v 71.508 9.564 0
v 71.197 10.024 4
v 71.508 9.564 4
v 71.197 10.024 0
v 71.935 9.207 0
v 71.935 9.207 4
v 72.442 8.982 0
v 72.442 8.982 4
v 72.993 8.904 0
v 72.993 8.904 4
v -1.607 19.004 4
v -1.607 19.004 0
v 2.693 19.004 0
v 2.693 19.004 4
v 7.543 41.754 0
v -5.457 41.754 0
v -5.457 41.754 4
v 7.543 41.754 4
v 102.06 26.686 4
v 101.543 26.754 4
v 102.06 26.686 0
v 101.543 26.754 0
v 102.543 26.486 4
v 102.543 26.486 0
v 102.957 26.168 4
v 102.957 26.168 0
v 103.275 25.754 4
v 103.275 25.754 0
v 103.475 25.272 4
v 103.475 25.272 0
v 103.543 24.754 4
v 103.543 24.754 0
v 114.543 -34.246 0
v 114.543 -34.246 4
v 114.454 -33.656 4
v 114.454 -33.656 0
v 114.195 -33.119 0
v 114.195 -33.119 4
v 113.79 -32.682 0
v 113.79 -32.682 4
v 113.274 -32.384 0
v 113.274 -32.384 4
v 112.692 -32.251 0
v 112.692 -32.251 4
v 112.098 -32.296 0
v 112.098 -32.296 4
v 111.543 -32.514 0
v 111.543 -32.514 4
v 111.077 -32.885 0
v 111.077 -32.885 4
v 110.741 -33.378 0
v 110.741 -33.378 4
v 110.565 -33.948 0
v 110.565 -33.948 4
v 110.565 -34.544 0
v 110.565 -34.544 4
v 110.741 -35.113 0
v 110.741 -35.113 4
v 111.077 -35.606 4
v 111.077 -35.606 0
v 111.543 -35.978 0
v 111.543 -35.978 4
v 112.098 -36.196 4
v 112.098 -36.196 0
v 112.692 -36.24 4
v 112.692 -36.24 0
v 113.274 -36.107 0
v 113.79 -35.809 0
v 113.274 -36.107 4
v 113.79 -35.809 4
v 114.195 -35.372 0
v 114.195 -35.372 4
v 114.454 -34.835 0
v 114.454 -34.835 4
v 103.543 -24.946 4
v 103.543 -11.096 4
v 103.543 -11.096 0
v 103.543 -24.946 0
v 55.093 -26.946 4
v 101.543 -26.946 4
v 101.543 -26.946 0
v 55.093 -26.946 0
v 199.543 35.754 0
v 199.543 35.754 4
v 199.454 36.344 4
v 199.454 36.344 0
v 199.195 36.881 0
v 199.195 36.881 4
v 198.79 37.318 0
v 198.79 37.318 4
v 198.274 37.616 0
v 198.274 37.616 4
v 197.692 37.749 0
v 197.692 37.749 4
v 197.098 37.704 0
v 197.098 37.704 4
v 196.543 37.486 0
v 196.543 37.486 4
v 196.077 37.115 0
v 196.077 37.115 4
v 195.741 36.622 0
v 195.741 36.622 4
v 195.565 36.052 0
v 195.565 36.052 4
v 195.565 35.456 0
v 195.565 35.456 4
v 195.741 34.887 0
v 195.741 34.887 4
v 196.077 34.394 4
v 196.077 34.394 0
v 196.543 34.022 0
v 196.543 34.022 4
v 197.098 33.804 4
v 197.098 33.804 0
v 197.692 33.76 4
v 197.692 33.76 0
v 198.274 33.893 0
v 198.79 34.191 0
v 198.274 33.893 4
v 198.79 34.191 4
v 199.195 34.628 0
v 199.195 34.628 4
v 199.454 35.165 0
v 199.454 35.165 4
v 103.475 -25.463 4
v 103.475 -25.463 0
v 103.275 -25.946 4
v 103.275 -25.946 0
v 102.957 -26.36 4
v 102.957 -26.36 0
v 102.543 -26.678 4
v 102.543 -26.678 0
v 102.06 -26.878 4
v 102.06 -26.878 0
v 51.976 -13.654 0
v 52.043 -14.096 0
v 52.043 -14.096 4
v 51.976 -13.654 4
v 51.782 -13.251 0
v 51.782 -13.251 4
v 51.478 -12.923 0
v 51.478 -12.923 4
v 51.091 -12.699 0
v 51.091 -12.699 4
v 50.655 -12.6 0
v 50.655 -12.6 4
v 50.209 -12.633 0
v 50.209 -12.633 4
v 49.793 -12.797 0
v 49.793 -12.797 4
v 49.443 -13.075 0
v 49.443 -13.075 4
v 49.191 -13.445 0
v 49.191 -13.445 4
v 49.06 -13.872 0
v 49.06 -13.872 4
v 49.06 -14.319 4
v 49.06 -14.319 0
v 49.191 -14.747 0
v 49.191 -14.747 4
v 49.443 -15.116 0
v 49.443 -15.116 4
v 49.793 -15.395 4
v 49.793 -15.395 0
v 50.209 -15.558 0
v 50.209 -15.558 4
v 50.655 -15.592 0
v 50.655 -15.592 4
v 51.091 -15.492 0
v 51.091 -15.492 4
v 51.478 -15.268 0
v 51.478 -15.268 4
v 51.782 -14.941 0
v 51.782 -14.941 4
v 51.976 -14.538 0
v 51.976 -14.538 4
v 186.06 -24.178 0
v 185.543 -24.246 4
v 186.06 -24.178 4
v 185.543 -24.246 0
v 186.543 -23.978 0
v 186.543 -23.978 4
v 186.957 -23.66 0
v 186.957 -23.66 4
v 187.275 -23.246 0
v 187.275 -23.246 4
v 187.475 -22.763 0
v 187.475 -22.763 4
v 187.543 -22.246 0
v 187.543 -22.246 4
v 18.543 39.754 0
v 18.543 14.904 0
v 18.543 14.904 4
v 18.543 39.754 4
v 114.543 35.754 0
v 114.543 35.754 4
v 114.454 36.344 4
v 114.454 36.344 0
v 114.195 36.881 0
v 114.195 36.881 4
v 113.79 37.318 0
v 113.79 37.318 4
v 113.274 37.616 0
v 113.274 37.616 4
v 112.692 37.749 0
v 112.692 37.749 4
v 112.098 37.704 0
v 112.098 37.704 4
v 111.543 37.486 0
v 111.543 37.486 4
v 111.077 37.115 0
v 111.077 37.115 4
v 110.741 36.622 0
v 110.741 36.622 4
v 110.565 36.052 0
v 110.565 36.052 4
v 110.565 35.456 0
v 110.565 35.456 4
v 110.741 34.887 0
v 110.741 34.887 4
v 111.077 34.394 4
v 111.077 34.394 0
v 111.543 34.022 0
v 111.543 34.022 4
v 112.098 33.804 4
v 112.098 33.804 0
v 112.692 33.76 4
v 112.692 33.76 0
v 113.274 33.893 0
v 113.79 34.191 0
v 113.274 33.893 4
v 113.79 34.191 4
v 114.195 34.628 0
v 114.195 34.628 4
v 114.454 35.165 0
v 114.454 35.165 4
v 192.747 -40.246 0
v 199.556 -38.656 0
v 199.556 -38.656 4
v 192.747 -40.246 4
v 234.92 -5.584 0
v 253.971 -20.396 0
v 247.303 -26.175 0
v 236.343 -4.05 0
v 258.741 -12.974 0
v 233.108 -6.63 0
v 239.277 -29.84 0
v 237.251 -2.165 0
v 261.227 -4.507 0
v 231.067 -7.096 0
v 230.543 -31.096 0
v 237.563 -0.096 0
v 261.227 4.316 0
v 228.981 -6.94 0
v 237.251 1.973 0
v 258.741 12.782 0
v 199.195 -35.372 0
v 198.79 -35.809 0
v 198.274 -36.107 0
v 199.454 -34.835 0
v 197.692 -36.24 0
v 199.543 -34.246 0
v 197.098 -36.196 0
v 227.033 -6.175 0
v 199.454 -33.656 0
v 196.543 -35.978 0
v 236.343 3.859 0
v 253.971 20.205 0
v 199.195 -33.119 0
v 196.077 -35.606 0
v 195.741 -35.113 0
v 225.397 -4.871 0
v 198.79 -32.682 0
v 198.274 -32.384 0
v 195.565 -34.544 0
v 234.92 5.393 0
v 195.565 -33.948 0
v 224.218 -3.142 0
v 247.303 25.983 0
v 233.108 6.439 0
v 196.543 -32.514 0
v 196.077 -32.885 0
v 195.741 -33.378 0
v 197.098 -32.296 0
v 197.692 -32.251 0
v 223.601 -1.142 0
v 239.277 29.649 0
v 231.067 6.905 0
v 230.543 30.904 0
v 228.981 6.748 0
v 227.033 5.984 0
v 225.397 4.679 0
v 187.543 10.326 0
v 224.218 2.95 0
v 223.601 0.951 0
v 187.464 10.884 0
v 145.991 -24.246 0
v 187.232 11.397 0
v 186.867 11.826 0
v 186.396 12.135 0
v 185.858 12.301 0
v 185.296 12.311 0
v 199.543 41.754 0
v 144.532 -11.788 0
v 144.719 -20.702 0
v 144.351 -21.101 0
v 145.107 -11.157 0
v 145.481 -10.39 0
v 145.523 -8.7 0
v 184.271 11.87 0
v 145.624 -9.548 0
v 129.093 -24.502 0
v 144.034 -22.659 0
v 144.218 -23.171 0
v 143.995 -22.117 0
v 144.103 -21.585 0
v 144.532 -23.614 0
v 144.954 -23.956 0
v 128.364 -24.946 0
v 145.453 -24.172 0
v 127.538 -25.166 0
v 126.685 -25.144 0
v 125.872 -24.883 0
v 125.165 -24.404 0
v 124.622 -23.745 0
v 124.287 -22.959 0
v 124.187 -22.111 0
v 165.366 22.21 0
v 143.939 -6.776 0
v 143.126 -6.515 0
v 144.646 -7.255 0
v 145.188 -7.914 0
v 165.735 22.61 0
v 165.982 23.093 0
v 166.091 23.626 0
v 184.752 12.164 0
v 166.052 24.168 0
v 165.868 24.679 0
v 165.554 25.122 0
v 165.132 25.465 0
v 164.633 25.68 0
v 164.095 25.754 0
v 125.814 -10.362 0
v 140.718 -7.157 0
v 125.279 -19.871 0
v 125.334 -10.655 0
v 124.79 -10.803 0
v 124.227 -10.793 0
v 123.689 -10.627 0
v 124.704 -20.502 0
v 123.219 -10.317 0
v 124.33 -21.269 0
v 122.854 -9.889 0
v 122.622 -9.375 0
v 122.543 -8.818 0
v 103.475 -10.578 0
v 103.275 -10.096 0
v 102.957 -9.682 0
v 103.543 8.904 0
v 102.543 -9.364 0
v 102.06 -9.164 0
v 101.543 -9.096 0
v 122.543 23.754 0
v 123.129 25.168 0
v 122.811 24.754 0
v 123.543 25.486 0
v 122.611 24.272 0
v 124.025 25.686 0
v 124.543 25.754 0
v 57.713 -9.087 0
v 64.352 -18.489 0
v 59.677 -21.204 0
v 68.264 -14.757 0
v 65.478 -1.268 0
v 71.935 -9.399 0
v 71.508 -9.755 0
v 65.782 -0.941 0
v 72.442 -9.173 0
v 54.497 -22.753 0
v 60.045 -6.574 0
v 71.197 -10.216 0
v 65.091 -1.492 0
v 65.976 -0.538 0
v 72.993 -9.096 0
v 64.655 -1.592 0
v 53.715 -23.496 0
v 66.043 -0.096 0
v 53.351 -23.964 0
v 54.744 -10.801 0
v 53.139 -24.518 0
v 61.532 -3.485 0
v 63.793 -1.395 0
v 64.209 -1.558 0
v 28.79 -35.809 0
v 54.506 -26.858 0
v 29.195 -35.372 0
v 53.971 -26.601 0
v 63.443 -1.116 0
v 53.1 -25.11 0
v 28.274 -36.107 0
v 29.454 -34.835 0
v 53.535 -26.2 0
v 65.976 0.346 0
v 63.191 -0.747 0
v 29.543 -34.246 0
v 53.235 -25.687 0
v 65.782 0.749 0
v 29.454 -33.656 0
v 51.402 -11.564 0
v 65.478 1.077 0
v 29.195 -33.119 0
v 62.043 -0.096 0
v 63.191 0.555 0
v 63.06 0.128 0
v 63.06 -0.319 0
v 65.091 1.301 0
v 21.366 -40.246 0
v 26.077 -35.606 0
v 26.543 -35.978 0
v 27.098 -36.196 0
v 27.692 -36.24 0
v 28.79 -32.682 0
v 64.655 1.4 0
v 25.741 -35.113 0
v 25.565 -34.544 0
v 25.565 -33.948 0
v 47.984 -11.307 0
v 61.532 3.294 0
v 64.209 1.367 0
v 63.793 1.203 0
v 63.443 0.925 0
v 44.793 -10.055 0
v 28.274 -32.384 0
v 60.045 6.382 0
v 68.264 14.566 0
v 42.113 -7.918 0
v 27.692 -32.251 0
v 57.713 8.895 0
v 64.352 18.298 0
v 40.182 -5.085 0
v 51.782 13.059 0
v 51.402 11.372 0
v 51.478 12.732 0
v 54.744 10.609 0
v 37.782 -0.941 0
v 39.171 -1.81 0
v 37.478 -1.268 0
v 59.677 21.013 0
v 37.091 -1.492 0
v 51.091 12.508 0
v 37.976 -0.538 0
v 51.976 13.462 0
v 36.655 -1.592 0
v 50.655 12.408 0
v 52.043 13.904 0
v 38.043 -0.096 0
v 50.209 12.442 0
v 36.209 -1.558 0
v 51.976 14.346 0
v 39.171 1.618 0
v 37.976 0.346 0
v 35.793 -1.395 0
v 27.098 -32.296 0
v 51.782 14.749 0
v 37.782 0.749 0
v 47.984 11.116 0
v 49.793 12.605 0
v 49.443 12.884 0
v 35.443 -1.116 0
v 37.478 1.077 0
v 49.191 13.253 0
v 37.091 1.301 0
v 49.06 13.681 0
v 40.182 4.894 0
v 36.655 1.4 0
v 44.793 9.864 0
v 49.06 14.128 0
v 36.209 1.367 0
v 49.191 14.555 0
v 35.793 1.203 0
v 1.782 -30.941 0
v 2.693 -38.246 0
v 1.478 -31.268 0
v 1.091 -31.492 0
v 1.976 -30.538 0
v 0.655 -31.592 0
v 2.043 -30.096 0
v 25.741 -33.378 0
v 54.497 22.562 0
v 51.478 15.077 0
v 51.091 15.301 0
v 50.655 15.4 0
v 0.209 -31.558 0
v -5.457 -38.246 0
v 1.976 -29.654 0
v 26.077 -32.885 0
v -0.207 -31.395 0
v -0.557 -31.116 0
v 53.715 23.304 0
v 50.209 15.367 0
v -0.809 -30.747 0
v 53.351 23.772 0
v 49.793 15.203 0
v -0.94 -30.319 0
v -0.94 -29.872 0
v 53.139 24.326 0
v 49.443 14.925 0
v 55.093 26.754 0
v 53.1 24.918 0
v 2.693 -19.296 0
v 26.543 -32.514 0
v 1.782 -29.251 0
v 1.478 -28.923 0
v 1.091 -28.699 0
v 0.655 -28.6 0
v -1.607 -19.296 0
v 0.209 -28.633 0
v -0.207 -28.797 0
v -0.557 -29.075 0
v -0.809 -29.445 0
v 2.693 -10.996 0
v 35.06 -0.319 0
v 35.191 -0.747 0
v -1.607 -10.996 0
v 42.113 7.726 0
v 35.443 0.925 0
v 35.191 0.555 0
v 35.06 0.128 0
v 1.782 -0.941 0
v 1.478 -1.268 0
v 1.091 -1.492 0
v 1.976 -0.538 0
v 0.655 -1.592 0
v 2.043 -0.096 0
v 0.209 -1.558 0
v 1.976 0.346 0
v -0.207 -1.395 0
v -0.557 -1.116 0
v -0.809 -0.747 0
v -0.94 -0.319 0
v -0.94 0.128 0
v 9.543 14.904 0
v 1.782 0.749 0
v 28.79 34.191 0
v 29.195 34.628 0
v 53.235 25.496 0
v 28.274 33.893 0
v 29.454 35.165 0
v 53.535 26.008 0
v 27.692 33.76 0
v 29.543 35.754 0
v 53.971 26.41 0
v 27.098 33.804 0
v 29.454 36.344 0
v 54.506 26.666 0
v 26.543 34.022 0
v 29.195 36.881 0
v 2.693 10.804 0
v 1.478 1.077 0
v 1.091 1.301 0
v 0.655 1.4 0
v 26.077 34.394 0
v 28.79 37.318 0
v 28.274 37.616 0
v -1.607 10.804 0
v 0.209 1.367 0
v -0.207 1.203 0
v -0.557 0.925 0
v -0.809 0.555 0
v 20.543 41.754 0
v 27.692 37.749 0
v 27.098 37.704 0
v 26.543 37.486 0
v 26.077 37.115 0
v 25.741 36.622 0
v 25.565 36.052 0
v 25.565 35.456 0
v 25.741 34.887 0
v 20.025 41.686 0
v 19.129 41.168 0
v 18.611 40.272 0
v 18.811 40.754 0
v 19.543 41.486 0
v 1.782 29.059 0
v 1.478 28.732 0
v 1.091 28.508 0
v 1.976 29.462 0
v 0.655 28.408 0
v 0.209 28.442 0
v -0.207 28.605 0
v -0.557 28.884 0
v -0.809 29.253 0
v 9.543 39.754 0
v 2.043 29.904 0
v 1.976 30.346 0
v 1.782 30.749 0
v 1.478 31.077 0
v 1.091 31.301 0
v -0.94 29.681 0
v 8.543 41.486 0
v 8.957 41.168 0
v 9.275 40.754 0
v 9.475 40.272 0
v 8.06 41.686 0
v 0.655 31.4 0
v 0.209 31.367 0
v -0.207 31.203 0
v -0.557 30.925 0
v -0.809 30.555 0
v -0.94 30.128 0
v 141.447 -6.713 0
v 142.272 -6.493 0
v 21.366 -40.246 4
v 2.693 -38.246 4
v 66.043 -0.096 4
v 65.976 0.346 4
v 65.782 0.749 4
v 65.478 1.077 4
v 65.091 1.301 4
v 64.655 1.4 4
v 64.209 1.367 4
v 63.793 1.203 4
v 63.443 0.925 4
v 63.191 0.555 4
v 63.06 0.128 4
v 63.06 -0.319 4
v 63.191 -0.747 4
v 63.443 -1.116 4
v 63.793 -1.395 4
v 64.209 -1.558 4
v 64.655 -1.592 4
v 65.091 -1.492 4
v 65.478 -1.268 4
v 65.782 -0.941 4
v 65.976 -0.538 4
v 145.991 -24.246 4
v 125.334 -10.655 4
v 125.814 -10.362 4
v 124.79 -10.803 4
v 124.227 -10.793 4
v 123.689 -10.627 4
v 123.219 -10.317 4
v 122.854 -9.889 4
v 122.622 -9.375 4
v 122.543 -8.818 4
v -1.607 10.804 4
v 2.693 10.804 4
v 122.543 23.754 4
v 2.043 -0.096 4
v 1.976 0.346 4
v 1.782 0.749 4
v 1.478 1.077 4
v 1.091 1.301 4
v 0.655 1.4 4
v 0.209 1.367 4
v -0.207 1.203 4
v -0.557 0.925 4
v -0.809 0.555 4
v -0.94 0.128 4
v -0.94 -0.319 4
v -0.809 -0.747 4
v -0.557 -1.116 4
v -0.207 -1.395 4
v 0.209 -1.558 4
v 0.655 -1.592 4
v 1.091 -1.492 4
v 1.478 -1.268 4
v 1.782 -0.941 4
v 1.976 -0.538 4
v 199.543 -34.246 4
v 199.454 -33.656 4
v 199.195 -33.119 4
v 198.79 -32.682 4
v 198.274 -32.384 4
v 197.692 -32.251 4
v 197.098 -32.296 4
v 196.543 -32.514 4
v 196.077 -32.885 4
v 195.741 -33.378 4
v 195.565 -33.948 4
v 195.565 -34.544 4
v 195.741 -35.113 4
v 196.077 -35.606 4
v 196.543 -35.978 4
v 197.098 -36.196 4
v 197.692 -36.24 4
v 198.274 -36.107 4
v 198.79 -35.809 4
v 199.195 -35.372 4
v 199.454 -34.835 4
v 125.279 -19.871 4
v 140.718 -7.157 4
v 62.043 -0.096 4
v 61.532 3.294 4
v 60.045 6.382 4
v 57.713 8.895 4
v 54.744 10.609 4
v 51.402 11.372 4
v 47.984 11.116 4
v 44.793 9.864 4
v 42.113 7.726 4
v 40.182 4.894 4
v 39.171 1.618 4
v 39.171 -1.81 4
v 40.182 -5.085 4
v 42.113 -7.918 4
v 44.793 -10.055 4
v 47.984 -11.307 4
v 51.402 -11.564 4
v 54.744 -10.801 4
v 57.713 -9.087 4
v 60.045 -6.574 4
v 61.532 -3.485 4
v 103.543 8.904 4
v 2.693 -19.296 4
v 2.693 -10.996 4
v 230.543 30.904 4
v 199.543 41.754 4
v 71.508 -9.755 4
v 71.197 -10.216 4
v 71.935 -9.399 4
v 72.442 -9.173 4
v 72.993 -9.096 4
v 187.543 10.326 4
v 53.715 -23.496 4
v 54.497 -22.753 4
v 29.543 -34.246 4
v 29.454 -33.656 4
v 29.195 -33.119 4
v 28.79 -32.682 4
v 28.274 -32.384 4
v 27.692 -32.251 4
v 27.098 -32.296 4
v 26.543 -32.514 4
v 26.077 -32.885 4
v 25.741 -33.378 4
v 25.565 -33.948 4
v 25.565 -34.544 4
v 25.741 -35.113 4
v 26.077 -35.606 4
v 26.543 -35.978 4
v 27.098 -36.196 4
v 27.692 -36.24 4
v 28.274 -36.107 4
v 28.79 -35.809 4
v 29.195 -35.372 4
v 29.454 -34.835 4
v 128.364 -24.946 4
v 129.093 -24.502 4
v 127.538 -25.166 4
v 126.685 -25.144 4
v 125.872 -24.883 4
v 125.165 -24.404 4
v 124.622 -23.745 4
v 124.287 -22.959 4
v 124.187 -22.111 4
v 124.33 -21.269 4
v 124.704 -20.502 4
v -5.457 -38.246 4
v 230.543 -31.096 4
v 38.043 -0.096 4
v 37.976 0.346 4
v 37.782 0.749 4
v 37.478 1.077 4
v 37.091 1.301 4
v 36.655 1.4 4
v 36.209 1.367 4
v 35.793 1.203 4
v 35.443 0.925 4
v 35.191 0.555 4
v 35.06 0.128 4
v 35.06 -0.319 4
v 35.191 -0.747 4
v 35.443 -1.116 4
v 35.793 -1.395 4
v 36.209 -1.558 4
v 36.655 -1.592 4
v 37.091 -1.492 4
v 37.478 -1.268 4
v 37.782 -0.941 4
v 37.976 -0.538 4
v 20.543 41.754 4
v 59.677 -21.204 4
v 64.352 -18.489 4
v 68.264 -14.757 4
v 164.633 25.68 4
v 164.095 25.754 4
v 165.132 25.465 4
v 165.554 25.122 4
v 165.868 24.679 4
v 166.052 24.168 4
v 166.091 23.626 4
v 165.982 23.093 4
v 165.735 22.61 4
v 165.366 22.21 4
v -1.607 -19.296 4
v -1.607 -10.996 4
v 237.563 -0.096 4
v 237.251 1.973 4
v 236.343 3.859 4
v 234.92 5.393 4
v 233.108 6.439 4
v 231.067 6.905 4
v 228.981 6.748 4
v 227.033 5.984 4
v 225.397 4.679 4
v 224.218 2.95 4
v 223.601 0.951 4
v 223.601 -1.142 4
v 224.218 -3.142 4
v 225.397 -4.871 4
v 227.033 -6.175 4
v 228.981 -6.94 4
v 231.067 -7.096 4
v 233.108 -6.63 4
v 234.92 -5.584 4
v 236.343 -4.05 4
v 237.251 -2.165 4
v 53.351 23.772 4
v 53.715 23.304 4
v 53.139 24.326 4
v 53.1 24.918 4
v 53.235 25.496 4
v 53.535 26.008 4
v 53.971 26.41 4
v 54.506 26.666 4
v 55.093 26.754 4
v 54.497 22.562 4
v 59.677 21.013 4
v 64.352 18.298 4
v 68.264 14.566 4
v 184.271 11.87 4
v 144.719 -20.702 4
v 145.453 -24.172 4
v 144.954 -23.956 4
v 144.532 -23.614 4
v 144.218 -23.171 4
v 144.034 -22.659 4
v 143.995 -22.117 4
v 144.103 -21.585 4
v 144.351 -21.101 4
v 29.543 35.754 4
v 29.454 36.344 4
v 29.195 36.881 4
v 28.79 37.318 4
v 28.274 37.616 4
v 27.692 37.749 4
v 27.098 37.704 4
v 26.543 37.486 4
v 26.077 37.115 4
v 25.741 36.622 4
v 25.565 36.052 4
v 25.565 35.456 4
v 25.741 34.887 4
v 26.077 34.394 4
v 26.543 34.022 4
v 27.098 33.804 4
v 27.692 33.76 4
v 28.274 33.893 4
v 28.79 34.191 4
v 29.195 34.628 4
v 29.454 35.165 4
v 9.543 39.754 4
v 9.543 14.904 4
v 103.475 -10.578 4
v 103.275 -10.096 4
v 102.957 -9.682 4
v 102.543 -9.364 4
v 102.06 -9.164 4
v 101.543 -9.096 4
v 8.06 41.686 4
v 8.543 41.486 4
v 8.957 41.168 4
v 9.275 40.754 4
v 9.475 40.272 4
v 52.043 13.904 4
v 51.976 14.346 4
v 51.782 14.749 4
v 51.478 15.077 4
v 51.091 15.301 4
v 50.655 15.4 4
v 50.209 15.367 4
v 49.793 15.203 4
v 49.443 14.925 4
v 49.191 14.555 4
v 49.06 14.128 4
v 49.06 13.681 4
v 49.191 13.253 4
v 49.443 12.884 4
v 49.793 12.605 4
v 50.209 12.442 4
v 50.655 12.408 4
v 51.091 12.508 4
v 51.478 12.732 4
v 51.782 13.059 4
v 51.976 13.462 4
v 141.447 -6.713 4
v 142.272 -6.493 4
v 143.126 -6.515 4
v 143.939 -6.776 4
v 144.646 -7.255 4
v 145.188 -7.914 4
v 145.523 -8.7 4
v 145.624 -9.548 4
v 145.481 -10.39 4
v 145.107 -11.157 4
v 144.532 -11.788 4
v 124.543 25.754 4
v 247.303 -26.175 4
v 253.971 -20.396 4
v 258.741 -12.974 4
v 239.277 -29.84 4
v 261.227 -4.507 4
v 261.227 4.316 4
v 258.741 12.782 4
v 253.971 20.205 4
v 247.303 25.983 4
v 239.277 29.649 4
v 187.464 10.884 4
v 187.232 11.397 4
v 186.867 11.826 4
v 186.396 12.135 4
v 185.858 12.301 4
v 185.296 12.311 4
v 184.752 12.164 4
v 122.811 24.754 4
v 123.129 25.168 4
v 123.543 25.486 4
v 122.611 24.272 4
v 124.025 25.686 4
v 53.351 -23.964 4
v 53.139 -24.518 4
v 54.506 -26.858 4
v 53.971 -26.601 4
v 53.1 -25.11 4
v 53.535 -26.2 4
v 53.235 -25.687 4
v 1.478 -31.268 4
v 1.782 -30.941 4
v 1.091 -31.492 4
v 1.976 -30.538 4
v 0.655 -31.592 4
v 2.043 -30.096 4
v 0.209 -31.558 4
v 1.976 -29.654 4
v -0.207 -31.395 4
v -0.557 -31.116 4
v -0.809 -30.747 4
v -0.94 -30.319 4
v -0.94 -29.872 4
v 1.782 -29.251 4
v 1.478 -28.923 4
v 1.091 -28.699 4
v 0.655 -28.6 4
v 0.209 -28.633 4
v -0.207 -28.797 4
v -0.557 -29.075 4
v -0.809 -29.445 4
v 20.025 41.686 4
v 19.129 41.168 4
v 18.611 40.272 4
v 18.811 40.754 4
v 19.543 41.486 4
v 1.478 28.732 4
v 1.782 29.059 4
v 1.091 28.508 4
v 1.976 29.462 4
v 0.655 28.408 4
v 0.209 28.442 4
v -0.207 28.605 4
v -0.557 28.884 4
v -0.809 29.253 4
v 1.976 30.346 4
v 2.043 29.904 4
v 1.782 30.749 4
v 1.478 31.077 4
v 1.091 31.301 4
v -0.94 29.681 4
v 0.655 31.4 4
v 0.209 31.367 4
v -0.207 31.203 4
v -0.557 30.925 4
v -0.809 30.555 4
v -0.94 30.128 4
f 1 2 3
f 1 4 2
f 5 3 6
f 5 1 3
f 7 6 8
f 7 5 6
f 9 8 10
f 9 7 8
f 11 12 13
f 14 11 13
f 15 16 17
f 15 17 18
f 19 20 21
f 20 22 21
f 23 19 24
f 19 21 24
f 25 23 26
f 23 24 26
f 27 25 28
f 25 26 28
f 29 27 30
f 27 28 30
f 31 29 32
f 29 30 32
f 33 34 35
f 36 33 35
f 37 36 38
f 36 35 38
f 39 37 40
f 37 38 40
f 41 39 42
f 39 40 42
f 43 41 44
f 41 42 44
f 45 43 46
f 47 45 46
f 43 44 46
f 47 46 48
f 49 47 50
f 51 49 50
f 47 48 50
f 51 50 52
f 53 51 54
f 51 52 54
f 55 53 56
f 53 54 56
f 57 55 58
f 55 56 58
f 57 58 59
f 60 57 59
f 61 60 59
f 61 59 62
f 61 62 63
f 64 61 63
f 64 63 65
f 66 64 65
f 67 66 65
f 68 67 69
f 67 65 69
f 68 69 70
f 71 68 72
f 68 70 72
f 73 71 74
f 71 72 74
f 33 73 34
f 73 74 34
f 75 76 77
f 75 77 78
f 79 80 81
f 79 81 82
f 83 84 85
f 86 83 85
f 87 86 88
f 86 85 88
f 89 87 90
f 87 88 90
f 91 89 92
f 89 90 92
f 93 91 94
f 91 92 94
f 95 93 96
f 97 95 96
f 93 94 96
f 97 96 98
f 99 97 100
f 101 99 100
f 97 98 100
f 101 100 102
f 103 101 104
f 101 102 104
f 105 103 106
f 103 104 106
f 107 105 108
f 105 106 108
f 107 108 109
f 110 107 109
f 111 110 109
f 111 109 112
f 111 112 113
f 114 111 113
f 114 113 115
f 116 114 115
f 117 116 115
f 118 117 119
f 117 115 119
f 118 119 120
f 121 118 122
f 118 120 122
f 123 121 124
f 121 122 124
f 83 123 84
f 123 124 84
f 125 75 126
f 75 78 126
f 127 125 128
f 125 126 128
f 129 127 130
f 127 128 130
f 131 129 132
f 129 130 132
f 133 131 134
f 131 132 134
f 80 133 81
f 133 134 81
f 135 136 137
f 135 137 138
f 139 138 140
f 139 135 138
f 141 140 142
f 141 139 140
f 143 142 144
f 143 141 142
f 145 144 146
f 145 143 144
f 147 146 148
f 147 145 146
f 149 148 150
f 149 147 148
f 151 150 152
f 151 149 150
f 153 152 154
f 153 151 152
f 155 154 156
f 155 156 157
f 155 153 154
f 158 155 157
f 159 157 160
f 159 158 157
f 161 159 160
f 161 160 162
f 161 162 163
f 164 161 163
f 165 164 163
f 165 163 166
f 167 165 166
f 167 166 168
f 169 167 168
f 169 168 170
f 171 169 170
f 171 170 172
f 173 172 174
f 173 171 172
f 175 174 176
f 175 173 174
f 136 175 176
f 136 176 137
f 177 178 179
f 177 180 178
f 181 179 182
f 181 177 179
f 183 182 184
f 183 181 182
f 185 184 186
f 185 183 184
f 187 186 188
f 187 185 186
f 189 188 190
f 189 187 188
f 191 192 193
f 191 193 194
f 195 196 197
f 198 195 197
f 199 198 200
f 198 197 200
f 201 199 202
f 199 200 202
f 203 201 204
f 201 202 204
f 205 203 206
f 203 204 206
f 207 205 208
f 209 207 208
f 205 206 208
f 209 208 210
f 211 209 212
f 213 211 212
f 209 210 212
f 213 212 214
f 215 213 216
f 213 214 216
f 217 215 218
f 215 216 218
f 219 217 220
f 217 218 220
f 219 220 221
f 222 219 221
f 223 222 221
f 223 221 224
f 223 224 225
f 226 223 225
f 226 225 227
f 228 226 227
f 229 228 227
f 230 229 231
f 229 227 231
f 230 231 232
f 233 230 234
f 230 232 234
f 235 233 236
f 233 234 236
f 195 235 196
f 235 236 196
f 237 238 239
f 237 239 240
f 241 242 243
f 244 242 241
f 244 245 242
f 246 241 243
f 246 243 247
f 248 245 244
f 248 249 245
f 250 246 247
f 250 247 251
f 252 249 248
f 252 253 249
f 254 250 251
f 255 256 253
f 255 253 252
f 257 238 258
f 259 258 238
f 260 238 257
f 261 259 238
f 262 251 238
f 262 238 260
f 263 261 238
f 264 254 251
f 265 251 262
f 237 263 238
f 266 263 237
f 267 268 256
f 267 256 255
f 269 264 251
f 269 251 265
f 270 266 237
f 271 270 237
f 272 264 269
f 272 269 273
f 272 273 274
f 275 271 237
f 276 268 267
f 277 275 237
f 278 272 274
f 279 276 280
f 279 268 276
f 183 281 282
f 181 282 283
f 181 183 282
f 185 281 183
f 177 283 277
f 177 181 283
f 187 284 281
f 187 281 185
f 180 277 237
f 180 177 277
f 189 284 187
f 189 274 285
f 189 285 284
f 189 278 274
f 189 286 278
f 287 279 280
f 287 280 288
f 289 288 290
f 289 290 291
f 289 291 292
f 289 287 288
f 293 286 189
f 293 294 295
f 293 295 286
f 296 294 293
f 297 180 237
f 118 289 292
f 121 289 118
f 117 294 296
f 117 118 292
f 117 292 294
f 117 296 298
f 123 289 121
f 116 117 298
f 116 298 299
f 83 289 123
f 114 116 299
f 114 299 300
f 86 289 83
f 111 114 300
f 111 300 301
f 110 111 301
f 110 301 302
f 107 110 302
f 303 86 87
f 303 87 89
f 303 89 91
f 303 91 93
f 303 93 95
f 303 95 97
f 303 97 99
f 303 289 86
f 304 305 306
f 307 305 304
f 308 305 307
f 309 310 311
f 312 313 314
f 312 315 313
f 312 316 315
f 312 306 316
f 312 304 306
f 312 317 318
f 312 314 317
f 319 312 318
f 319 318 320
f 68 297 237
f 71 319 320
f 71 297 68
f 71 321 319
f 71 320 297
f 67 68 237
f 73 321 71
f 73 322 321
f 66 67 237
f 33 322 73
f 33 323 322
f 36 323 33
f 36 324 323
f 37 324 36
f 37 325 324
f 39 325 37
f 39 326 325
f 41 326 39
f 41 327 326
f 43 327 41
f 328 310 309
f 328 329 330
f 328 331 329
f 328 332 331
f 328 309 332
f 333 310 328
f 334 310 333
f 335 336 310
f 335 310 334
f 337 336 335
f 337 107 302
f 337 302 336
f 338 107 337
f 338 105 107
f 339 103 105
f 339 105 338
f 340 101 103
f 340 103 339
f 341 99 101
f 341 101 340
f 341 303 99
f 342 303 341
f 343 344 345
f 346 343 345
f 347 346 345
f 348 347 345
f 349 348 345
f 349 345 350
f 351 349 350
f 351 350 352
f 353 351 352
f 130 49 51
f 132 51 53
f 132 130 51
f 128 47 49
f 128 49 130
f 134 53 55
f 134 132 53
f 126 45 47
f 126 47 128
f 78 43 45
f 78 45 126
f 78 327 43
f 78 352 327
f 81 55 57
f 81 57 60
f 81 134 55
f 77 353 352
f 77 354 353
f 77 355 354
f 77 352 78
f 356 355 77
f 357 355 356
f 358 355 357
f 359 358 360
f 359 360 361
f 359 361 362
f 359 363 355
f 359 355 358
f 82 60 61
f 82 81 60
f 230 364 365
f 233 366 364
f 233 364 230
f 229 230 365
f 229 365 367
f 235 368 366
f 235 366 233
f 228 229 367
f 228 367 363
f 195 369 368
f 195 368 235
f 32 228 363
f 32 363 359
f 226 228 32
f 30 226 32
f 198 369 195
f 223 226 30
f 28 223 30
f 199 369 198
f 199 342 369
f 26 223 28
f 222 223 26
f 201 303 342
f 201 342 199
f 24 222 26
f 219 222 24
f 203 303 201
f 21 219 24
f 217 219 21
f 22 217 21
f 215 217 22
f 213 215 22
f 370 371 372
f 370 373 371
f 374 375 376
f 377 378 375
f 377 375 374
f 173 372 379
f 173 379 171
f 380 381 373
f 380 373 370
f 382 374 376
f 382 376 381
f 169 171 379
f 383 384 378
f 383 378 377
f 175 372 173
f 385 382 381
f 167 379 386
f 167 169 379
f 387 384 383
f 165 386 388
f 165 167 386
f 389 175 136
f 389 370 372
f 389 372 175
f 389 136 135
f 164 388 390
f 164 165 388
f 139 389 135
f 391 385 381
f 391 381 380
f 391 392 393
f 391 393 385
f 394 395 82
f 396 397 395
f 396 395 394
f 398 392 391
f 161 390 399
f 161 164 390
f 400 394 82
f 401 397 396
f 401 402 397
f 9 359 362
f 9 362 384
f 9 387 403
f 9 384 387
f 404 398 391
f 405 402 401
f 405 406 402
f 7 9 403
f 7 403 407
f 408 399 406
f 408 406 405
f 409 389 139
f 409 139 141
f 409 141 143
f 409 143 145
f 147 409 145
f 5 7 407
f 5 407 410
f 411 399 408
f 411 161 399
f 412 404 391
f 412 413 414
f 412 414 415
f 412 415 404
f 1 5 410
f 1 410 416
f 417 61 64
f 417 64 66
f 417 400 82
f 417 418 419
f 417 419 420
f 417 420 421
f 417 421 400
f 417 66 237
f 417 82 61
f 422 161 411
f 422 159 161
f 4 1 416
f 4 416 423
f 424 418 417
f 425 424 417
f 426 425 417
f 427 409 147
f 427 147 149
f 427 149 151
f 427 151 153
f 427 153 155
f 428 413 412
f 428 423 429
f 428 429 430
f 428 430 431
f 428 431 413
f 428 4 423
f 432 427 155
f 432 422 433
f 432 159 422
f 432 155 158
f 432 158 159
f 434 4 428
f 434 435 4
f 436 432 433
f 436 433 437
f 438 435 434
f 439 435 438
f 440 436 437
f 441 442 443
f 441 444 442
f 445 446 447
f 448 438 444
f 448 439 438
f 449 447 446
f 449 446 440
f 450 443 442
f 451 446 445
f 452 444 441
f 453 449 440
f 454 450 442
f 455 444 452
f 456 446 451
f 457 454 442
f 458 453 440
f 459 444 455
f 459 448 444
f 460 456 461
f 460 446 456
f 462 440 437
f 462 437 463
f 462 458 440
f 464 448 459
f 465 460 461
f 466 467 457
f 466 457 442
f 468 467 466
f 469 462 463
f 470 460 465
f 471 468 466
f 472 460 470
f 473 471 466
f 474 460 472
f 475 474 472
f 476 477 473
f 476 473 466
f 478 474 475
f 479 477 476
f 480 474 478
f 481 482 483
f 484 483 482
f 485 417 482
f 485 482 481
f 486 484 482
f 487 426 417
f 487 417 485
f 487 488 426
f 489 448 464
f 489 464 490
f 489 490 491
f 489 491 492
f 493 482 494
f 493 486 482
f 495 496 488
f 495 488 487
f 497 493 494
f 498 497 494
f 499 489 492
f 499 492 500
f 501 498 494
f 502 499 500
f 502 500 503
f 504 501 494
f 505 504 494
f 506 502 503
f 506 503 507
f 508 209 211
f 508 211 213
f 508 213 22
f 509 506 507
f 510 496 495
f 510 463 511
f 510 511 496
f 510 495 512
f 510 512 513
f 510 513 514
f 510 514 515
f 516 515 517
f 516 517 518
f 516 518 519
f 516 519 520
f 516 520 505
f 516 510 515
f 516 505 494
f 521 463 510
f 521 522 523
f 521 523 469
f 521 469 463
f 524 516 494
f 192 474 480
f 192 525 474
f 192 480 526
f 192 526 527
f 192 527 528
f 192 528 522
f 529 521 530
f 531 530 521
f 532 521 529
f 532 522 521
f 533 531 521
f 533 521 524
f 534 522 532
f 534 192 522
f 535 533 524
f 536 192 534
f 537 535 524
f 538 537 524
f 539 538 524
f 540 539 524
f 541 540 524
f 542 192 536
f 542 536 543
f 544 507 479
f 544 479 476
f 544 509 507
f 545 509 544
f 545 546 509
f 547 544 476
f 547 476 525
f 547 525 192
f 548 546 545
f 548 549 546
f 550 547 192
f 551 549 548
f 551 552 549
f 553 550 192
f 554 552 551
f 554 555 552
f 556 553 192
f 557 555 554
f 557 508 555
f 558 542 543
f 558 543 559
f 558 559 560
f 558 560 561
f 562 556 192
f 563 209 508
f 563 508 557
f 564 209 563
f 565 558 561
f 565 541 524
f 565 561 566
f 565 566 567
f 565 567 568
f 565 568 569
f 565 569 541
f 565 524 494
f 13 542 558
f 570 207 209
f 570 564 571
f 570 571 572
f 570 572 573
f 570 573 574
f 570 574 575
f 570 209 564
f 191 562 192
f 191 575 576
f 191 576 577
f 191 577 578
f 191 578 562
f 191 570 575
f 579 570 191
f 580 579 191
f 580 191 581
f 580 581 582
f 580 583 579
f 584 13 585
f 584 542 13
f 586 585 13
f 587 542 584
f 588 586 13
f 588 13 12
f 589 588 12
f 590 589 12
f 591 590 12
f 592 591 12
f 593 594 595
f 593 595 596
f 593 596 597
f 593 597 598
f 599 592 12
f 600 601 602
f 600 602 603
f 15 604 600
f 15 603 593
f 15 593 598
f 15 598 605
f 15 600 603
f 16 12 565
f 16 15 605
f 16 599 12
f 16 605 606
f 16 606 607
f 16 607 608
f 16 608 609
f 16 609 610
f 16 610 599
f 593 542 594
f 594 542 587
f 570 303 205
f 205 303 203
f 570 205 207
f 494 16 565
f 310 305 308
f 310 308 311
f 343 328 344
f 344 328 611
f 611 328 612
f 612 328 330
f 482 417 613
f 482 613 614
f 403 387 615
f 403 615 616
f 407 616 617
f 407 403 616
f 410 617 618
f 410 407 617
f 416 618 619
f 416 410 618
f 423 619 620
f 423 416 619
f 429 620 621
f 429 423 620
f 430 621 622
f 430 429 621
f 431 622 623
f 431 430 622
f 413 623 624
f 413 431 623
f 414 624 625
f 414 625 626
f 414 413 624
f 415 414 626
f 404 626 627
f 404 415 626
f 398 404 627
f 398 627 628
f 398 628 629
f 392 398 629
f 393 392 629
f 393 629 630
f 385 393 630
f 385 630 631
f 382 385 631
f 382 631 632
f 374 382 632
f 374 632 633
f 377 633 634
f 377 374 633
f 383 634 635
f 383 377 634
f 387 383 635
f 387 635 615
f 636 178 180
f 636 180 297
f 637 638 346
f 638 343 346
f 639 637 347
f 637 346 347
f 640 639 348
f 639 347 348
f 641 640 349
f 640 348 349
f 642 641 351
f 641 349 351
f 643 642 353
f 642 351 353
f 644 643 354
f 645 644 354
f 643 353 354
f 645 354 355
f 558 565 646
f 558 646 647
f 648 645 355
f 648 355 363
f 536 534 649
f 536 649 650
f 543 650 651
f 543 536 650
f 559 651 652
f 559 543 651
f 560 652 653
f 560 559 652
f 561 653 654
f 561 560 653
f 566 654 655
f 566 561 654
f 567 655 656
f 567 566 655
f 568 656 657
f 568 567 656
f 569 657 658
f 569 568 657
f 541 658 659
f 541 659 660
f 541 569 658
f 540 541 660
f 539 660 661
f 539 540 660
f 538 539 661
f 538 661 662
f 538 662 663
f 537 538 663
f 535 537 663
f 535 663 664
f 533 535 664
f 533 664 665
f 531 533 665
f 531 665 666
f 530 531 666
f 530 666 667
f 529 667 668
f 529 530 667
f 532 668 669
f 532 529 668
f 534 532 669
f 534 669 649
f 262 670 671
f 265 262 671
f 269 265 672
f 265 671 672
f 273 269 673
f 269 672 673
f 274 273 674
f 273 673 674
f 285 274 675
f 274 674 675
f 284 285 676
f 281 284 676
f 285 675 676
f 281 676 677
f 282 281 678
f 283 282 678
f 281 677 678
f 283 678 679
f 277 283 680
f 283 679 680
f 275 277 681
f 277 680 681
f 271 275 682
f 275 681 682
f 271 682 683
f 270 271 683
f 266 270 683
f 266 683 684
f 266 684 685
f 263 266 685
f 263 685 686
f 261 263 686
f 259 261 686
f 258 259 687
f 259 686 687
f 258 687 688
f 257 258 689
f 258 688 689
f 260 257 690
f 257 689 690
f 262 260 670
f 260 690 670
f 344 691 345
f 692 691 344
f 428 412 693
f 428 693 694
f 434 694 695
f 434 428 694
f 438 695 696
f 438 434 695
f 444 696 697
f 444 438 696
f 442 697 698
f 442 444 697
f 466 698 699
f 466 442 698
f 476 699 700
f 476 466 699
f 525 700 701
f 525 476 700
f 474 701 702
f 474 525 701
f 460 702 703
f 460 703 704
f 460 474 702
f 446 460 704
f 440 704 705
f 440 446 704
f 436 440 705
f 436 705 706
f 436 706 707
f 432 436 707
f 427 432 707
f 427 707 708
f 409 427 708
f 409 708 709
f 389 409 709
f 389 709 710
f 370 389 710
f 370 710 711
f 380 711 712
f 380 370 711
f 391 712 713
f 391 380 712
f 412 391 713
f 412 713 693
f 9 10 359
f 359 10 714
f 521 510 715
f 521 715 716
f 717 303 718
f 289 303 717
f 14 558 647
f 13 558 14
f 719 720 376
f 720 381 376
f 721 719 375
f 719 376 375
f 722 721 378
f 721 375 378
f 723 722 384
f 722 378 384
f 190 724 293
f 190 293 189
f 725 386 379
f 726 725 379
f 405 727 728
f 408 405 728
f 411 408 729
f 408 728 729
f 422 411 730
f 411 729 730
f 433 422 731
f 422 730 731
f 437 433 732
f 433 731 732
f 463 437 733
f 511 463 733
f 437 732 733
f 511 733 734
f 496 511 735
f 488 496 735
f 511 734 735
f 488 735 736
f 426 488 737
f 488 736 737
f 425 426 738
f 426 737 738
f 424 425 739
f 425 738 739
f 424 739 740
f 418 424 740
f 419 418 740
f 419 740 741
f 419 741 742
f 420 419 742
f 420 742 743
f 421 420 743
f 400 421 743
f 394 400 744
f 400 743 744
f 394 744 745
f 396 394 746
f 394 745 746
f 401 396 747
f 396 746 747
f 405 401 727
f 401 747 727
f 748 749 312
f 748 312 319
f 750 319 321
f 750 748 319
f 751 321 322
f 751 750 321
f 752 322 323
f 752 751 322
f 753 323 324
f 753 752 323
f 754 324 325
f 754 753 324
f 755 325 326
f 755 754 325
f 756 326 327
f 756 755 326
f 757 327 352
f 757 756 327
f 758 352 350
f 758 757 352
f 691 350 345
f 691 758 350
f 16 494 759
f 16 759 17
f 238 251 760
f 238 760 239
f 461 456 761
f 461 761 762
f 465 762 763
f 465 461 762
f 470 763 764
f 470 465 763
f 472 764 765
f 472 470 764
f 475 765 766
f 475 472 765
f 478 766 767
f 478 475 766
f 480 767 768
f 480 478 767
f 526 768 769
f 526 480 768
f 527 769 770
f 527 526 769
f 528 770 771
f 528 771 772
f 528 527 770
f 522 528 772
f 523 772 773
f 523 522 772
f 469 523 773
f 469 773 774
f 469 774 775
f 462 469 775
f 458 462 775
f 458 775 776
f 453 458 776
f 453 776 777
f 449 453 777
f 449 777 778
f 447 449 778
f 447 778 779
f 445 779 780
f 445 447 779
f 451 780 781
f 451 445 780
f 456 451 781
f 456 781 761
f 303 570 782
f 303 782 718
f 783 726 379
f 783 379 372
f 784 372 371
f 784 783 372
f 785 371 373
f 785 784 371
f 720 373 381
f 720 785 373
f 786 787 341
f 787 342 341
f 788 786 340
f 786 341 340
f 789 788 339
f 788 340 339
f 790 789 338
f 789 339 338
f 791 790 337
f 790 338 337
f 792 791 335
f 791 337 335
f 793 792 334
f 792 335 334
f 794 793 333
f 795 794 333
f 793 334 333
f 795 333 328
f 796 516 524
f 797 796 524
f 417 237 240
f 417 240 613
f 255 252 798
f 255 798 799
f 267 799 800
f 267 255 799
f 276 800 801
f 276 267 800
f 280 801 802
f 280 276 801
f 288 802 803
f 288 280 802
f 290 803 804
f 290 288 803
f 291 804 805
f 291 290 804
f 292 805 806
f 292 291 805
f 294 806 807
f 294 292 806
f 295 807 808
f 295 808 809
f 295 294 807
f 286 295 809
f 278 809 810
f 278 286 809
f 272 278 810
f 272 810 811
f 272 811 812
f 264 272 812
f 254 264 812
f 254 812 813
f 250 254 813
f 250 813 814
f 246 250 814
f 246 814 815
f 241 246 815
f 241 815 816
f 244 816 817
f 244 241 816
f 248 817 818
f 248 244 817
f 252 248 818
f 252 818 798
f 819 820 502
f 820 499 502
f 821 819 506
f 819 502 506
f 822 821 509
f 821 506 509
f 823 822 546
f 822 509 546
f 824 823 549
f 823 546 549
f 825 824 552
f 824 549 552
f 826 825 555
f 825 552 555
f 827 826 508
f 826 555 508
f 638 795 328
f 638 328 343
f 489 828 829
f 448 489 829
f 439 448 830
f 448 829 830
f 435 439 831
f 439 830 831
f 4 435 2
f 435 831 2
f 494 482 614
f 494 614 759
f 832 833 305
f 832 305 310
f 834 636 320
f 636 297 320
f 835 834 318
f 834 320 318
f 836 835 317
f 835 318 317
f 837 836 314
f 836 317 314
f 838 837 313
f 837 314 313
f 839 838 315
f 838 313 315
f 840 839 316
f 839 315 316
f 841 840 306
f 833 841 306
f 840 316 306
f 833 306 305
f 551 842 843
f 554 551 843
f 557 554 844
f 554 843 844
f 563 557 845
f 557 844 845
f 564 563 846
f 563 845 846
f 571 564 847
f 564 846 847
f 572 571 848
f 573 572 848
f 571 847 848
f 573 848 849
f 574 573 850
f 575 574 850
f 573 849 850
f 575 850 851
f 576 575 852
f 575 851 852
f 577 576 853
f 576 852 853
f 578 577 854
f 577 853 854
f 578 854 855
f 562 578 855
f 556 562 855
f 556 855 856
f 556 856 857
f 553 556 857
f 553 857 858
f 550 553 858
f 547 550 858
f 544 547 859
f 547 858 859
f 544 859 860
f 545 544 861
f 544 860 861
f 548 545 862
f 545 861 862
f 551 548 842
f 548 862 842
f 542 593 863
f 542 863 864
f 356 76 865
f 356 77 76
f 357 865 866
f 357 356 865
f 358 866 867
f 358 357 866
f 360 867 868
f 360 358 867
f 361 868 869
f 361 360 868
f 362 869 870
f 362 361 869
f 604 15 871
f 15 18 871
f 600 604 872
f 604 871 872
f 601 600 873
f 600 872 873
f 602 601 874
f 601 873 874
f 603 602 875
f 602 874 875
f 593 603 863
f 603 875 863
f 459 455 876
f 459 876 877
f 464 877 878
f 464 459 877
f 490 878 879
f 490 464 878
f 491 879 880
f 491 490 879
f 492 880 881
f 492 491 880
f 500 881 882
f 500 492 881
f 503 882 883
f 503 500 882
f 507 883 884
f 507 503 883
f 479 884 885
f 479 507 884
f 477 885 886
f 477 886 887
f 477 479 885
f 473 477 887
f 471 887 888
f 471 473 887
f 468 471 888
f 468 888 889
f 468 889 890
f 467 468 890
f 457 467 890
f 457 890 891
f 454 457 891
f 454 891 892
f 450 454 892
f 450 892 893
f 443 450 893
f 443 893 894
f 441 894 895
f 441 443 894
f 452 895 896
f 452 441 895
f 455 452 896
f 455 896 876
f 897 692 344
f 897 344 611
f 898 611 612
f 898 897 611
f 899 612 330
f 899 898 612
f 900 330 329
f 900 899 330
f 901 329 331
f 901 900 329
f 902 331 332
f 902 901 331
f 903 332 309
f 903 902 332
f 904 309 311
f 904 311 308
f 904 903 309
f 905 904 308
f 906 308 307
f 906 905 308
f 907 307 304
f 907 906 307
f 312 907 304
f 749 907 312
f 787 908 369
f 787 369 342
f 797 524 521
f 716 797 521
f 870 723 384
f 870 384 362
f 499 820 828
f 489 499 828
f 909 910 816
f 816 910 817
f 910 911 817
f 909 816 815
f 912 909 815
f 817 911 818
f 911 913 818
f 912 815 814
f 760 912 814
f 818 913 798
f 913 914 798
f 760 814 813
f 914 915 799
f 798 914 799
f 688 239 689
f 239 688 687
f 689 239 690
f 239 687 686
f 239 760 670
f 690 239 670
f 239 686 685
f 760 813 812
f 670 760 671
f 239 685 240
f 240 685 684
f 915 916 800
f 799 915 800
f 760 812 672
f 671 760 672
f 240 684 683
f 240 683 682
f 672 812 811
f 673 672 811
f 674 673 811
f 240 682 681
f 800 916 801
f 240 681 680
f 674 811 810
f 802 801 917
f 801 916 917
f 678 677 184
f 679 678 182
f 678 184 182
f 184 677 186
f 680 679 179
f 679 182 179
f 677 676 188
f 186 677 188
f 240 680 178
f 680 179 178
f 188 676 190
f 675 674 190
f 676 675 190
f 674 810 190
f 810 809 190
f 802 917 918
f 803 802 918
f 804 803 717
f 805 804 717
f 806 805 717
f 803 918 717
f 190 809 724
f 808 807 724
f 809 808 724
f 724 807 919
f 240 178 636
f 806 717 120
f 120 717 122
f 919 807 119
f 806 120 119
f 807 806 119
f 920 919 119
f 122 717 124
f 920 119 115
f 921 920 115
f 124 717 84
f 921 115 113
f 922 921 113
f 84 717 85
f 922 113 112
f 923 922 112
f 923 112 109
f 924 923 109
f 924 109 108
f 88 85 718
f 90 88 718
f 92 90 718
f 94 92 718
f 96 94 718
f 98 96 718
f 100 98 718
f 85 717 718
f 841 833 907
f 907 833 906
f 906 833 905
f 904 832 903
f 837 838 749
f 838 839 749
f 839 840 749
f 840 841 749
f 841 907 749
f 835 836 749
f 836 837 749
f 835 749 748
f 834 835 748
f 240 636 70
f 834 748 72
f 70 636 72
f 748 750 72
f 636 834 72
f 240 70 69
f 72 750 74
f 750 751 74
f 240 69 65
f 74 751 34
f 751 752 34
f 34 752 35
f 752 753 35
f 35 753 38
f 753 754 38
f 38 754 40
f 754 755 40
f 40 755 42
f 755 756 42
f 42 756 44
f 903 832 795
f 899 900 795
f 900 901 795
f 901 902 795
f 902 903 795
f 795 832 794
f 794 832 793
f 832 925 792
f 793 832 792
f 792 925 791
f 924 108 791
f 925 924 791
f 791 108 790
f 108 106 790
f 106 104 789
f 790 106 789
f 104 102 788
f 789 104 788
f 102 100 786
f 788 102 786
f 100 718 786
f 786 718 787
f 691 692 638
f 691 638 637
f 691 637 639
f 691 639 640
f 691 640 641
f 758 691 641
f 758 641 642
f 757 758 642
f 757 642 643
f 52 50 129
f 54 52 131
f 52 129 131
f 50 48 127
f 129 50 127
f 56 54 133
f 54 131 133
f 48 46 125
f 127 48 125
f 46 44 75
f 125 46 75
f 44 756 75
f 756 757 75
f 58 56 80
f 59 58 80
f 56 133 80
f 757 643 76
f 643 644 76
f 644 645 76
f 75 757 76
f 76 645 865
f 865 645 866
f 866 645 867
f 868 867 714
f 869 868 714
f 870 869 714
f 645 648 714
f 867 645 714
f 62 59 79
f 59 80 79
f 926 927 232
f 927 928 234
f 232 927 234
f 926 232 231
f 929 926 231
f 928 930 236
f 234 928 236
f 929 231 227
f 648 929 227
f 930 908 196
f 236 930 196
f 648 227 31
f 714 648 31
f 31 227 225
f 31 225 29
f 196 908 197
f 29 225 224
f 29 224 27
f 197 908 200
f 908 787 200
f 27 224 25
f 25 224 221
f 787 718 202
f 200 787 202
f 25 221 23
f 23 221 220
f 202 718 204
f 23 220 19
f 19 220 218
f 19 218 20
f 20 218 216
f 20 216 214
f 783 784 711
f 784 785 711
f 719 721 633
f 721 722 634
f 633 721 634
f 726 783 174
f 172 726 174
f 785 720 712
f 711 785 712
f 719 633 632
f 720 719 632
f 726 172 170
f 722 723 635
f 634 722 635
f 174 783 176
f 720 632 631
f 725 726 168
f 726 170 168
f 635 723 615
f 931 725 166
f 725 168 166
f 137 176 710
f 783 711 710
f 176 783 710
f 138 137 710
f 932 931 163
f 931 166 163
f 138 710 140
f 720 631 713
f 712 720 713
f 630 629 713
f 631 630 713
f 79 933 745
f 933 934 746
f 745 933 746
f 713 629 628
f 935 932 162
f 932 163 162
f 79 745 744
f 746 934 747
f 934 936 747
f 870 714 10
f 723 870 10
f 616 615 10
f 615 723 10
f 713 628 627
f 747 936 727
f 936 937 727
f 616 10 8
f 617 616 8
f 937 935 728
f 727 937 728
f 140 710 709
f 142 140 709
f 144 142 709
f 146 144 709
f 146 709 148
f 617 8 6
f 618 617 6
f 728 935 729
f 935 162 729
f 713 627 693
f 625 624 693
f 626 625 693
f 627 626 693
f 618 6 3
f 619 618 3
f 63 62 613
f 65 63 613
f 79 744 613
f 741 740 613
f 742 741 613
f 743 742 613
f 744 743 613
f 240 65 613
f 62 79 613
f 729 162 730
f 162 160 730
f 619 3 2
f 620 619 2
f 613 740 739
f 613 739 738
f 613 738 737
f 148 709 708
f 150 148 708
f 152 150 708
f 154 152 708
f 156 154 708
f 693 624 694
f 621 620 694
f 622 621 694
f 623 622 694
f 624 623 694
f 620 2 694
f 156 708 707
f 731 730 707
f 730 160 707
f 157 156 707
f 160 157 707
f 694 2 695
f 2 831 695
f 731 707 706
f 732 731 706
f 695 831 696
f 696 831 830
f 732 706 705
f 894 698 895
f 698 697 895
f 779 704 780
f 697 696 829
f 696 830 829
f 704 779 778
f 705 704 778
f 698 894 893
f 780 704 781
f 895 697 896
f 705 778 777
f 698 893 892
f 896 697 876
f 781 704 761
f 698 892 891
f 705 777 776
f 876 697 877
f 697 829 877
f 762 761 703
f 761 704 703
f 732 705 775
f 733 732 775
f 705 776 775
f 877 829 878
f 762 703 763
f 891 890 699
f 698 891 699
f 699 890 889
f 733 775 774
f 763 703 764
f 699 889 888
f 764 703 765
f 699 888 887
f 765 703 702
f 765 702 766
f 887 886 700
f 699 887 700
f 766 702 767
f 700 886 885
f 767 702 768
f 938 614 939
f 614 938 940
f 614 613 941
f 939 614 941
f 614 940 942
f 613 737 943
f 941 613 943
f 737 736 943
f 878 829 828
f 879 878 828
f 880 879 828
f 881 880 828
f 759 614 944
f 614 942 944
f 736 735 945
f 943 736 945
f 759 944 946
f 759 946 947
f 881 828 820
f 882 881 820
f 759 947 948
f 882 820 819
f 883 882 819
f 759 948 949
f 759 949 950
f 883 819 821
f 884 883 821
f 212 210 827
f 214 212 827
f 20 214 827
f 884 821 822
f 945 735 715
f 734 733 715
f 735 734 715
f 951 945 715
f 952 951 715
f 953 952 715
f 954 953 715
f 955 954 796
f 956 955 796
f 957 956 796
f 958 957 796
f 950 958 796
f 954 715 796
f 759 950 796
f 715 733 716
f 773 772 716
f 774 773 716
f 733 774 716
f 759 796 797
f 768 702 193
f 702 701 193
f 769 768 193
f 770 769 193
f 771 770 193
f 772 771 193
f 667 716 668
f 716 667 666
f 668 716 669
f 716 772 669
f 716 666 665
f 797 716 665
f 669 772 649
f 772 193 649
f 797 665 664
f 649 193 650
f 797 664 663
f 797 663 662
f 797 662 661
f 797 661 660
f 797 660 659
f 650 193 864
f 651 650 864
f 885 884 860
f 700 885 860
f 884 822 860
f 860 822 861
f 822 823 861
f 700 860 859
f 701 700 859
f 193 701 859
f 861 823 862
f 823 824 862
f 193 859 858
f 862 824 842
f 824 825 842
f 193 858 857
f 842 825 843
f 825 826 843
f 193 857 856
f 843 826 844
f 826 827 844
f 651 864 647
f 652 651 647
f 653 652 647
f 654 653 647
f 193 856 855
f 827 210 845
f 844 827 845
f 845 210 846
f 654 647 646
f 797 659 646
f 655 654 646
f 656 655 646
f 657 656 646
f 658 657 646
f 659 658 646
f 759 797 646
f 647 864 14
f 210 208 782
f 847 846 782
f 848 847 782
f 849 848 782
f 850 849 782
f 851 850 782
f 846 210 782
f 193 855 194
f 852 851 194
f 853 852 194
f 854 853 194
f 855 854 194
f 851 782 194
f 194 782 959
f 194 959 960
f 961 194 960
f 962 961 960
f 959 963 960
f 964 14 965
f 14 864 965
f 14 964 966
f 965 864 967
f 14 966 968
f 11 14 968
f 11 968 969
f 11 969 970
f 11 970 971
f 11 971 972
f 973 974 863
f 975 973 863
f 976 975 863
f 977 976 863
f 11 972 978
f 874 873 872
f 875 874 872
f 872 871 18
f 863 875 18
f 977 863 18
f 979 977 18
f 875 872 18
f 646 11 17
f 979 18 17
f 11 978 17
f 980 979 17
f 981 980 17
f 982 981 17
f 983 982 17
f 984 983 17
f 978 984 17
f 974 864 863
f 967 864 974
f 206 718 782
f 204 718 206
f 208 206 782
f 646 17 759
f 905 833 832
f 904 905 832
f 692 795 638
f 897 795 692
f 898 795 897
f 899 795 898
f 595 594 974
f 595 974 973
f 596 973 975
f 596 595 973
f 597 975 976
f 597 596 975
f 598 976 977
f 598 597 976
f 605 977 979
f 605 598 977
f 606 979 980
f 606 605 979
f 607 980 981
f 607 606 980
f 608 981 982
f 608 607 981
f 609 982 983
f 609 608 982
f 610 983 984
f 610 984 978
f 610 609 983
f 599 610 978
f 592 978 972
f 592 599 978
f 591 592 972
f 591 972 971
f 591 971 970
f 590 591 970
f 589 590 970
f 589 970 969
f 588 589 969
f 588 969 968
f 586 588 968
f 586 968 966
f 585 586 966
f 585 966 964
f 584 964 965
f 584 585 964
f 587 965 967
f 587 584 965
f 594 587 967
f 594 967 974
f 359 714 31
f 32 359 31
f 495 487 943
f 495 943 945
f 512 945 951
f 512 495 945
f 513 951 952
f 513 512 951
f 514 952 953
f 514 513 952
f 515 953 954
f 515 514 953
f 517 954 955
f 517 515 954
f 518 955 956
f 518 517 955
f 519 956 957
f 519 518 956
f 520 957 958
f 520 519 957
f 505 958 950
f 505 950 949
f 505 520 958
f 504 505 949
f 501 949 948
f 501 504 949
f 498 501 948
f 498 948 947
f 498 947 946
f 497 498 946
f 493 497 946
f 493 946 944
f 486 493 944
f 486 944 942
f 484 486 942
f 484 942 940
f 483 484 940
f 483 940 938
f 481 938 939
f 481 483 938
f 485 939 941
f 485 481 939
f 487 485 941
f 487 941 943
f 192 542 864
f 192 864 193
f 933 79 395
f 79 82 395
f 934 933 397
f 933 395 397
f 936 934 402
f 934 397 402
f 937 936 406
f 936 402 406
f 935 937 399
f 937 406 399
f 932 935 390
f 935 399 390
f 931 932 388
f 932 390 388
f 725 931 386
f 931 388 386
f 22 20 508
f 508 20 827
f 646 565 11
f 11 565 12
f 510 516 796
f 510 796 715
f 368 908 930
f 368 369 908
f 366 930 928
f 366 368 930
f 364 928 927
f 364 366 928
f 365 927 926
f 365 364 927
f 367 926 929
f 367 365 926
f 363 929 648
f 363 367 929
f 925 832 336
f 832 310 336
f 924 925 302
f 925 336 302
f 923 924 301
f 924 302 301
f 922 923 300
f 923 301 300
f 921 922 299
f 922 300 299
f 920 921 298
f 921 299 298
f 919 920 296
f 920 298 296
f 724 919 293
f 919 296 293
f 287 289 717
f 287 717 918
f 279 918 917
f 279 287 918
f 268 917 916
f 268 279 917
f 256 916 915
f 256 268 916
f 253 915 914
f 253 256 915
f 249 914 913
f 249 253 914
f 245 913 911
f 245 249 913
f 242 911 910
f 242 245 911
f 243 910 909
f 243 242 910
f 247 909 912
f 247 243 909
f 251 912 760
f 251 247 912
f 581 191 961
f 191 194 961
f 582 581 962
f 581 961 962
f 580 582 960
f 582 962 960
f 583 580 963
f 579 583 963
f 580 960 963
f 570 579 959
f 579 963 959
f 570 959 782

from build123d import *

# Parameters (mm, degrees)
SKETCH_1_R          = 1.5
SKETCH_1_R_2        = 11.5
SKETCH_1_R_3        = 7.02
SKETCH_1_W          = 4.3
SKETCH_1_H          = 8.2
SKETCH_1_H_2        = 8.3
EXTRUDE_1_DEPTH     = 4
SKETCH_2_R          = 2
CUT_EXTRUDE_1_DEPTH = 4
FILLET_1_R          = 2


with BuildPart() as part:
    # 草图1 → 凸台-拉伸1 (new body)
    with BuildSketch(Plane.XY):
        with BuildLine():
            Line((-5.457142857, -0.095714286), (-5.457142857, 41.754285714))
            Line((-5.457142857, 41.754285714), (9.542857143, 41.754285714))
            Line((9.542857143, 41.754285714), (9.542857143, 14.904285714))
            Line((9.542857143, 14.904285714), (18.542857143, 14.904285714))
            Line((18.542857143, 14.904285714), (18.542857143, 41.754285714))
            Line((18.542857143, 41.754285714), (199.542857143, 41.754285714))
            Line((199.542857143, 41.754285714), (230.542857143, 30.904285714))
            ThreePointArc((230.542857143, 30.904285714), (261.542857143, -0.095714286), (230.542857143, -31.095714286))
            Line((230.542857143, -31.095714286), (199.556073527, -38.65591431))
            Line((199.556073527, -38.65591431), (192.746868021, -40.245714286))
            Line((192.746868021, -40.245714286), (21.365844759, -40.245714286))
            Line((21.365844759, -40.245714286), (2.692857143, -38.245714286))
            Line((2.692857143, -38.245714286), (-5.457142857, -38.245714286))
            Line((-5.457142857, -38.245714286), (-5.457142857, -0.095714286))
        make_face()
        with Locations((0.542857143, 29.904285714)):
            Circle(SKETCH_1_R, mode=Mode.SUBTRACT)
        with Locations((0.542857143, -0.095714286)):
            Circle(SKETCH_1_R, mode=Mode.SUBTRACT)
        with Locations((0.542857143, -30.095714286)):
            Circle(SKETCH_1_R, mode=Mode.SUBTRACT)
        with Locations((50.542857143, -0.095714286)):
            Circle(SKETCH_1_R_2, mode=Mode.SUBTRACT)
        with Locations((50.542857143, -14.095714286)):
            Circle(SKETCH_1_R, mode=Mode.SUBTRACT)
        with Locations((36.542857143, -0.095714286)):
            Circle(SKETCH_1_R, mode=Mode.SUBTRACT)
        with Locations((50.542857143, 13.904285714)):
            Circle(SKETCH_1_R, mode=Mode.SUBTRACT)
        with Locations((64.542857143, -0.095714286)):
            Circle(SKETCH_1_R, mode=Mode.SUBTRACT)
        with Locations((230.542857143, -0.095714286)):
            Circle(SKETCH_1_R_3, mode=Mode.SUBTRACT)
        with Locations((0.542857143, 14.904285714)):
            Rectangle(SKETCH_1_W, SKETCH_1_H, mode=Mode.SUBTRACT)
        with Locations((0.542857143, -15.145714286)):
            Rectangle(SKETCH_1_W, SKETCH_1_H_2, mode=Mode.SUBTRACT)
    extrude(amount=EXTRUDE_1_DEPTH)

    # 草图2 → 切除-拉伸1 (cut)
    with BuildSketch(Plane.XY.offset(4)):
        with Locations((27.542857143, 35.754285714)):
            Circle(SKETCH_2_R)
        with Locations((112.542857143, 35.754285714)):
            Circle(SKETCH_2_R)
        with Locations((197.542857143, 35.754285714)):
            Circle(SKETCH_2_R)
        with Locations((112.542857143, -34.245714286)):
            Circle(SKETCH_2_R)
        with Locations((197.542857143, -34.245714286)):
            Circle(SKETCH_2_R)
        with Locations((27.542857143, -34.245714286)):
            Circle(SKETCH_2_R)
        Polygon((187.542857143, -24.245714286), (140.41622539, -24.245714286), (187.542857143, 14.56445304), align=None)
        Polygon((122.542857143, 25.754285714), (169.669488896, 25.754285714), (122.542857143, -13.055881612), align=None)
        with BuildLine():
            Line((71.708867631, 8.904285714), (103.542857143, 8.904285714))
            Line((103.542857143, 8.904285714), (103.542857143, 26.754285714))
            Line((103.542857143, 26.754285714), (50.083702197, 26.754285714))
            Line((50.083702197, 26.754285714), (54.496758946, 22.561881803))
            ThreePointArc((54.496758946, 22.561881803), (64.839184682, 17.921361473), (71.708867631, 8.904285714))
        make_face()
        with BuildLine():
            Line((103.542857143, -9.095714286), (103.542857143, -26.945714286))
            Line((103.542857143, -26.945714286), (50.083702197, -26.945714286))
            Line((50.083702197, -26.945714286), (54.496758946, -22.753310375))
            ThreePointArc((54.496758946, -22.753310375), (64.839184682, -18.112790044), (71.708867631, -9.095714286))
            Line((71.708867631, -9.095714286), (103.542857143, -9.095714286))
        make_face()
        with BuildLine():
            Line((125.279005787, -19.870759717), (140.7176105, -7.15661466))
            ThreePointArc((140.7176105, -7.15661466), (144.940522965, -7.565283608), (144.531854017, -11.788196074))
            Line((144.531854017, -11.788196074), (129.093249305, -24.502341131))
            ThreePointArc((129.093249305, -24.502341131), (124.870336839, -24.093672183), (125.279005787, -19.870759717))
        make_face()
    extrude(amount=-CUT_EXTRUDE_1_DEPTH, mode=Mode.SUBTRACT)

    # 圆角1
    fillet_1_edges = [part.edges().sort_by_distance(p)[0] for p in [
        (71.708867631, 8.904285714, 2),
        (50.083702197, 26.754285714, 2),
        (103.542857143, 26.754285714, 2),
        (122.542857143, -13.055881612, 2),
        (122.542857143, 25.754285714, 2),
        (169.669488896, 25.754285714, 2),
        (187.542857143, 14.56445304, 2),
        (187.542857143, -24.245714286, 2),
        (140.41622539, -24.245714286, 2),
        (103.542857143, -26.945714286, 2),
        (50.083702197, -26.945714286, 2),
        (71.708867631, -9.095714286, 2),
        (103.542857143, -9.095714286, 2),
        (9.542857143, 41.754285714, 2),
        (18.542857143, 41.754285714, 2),
    ]]
    fillet(fillet_1_edges, radius=FILLET_1_R)


solid = part.part
